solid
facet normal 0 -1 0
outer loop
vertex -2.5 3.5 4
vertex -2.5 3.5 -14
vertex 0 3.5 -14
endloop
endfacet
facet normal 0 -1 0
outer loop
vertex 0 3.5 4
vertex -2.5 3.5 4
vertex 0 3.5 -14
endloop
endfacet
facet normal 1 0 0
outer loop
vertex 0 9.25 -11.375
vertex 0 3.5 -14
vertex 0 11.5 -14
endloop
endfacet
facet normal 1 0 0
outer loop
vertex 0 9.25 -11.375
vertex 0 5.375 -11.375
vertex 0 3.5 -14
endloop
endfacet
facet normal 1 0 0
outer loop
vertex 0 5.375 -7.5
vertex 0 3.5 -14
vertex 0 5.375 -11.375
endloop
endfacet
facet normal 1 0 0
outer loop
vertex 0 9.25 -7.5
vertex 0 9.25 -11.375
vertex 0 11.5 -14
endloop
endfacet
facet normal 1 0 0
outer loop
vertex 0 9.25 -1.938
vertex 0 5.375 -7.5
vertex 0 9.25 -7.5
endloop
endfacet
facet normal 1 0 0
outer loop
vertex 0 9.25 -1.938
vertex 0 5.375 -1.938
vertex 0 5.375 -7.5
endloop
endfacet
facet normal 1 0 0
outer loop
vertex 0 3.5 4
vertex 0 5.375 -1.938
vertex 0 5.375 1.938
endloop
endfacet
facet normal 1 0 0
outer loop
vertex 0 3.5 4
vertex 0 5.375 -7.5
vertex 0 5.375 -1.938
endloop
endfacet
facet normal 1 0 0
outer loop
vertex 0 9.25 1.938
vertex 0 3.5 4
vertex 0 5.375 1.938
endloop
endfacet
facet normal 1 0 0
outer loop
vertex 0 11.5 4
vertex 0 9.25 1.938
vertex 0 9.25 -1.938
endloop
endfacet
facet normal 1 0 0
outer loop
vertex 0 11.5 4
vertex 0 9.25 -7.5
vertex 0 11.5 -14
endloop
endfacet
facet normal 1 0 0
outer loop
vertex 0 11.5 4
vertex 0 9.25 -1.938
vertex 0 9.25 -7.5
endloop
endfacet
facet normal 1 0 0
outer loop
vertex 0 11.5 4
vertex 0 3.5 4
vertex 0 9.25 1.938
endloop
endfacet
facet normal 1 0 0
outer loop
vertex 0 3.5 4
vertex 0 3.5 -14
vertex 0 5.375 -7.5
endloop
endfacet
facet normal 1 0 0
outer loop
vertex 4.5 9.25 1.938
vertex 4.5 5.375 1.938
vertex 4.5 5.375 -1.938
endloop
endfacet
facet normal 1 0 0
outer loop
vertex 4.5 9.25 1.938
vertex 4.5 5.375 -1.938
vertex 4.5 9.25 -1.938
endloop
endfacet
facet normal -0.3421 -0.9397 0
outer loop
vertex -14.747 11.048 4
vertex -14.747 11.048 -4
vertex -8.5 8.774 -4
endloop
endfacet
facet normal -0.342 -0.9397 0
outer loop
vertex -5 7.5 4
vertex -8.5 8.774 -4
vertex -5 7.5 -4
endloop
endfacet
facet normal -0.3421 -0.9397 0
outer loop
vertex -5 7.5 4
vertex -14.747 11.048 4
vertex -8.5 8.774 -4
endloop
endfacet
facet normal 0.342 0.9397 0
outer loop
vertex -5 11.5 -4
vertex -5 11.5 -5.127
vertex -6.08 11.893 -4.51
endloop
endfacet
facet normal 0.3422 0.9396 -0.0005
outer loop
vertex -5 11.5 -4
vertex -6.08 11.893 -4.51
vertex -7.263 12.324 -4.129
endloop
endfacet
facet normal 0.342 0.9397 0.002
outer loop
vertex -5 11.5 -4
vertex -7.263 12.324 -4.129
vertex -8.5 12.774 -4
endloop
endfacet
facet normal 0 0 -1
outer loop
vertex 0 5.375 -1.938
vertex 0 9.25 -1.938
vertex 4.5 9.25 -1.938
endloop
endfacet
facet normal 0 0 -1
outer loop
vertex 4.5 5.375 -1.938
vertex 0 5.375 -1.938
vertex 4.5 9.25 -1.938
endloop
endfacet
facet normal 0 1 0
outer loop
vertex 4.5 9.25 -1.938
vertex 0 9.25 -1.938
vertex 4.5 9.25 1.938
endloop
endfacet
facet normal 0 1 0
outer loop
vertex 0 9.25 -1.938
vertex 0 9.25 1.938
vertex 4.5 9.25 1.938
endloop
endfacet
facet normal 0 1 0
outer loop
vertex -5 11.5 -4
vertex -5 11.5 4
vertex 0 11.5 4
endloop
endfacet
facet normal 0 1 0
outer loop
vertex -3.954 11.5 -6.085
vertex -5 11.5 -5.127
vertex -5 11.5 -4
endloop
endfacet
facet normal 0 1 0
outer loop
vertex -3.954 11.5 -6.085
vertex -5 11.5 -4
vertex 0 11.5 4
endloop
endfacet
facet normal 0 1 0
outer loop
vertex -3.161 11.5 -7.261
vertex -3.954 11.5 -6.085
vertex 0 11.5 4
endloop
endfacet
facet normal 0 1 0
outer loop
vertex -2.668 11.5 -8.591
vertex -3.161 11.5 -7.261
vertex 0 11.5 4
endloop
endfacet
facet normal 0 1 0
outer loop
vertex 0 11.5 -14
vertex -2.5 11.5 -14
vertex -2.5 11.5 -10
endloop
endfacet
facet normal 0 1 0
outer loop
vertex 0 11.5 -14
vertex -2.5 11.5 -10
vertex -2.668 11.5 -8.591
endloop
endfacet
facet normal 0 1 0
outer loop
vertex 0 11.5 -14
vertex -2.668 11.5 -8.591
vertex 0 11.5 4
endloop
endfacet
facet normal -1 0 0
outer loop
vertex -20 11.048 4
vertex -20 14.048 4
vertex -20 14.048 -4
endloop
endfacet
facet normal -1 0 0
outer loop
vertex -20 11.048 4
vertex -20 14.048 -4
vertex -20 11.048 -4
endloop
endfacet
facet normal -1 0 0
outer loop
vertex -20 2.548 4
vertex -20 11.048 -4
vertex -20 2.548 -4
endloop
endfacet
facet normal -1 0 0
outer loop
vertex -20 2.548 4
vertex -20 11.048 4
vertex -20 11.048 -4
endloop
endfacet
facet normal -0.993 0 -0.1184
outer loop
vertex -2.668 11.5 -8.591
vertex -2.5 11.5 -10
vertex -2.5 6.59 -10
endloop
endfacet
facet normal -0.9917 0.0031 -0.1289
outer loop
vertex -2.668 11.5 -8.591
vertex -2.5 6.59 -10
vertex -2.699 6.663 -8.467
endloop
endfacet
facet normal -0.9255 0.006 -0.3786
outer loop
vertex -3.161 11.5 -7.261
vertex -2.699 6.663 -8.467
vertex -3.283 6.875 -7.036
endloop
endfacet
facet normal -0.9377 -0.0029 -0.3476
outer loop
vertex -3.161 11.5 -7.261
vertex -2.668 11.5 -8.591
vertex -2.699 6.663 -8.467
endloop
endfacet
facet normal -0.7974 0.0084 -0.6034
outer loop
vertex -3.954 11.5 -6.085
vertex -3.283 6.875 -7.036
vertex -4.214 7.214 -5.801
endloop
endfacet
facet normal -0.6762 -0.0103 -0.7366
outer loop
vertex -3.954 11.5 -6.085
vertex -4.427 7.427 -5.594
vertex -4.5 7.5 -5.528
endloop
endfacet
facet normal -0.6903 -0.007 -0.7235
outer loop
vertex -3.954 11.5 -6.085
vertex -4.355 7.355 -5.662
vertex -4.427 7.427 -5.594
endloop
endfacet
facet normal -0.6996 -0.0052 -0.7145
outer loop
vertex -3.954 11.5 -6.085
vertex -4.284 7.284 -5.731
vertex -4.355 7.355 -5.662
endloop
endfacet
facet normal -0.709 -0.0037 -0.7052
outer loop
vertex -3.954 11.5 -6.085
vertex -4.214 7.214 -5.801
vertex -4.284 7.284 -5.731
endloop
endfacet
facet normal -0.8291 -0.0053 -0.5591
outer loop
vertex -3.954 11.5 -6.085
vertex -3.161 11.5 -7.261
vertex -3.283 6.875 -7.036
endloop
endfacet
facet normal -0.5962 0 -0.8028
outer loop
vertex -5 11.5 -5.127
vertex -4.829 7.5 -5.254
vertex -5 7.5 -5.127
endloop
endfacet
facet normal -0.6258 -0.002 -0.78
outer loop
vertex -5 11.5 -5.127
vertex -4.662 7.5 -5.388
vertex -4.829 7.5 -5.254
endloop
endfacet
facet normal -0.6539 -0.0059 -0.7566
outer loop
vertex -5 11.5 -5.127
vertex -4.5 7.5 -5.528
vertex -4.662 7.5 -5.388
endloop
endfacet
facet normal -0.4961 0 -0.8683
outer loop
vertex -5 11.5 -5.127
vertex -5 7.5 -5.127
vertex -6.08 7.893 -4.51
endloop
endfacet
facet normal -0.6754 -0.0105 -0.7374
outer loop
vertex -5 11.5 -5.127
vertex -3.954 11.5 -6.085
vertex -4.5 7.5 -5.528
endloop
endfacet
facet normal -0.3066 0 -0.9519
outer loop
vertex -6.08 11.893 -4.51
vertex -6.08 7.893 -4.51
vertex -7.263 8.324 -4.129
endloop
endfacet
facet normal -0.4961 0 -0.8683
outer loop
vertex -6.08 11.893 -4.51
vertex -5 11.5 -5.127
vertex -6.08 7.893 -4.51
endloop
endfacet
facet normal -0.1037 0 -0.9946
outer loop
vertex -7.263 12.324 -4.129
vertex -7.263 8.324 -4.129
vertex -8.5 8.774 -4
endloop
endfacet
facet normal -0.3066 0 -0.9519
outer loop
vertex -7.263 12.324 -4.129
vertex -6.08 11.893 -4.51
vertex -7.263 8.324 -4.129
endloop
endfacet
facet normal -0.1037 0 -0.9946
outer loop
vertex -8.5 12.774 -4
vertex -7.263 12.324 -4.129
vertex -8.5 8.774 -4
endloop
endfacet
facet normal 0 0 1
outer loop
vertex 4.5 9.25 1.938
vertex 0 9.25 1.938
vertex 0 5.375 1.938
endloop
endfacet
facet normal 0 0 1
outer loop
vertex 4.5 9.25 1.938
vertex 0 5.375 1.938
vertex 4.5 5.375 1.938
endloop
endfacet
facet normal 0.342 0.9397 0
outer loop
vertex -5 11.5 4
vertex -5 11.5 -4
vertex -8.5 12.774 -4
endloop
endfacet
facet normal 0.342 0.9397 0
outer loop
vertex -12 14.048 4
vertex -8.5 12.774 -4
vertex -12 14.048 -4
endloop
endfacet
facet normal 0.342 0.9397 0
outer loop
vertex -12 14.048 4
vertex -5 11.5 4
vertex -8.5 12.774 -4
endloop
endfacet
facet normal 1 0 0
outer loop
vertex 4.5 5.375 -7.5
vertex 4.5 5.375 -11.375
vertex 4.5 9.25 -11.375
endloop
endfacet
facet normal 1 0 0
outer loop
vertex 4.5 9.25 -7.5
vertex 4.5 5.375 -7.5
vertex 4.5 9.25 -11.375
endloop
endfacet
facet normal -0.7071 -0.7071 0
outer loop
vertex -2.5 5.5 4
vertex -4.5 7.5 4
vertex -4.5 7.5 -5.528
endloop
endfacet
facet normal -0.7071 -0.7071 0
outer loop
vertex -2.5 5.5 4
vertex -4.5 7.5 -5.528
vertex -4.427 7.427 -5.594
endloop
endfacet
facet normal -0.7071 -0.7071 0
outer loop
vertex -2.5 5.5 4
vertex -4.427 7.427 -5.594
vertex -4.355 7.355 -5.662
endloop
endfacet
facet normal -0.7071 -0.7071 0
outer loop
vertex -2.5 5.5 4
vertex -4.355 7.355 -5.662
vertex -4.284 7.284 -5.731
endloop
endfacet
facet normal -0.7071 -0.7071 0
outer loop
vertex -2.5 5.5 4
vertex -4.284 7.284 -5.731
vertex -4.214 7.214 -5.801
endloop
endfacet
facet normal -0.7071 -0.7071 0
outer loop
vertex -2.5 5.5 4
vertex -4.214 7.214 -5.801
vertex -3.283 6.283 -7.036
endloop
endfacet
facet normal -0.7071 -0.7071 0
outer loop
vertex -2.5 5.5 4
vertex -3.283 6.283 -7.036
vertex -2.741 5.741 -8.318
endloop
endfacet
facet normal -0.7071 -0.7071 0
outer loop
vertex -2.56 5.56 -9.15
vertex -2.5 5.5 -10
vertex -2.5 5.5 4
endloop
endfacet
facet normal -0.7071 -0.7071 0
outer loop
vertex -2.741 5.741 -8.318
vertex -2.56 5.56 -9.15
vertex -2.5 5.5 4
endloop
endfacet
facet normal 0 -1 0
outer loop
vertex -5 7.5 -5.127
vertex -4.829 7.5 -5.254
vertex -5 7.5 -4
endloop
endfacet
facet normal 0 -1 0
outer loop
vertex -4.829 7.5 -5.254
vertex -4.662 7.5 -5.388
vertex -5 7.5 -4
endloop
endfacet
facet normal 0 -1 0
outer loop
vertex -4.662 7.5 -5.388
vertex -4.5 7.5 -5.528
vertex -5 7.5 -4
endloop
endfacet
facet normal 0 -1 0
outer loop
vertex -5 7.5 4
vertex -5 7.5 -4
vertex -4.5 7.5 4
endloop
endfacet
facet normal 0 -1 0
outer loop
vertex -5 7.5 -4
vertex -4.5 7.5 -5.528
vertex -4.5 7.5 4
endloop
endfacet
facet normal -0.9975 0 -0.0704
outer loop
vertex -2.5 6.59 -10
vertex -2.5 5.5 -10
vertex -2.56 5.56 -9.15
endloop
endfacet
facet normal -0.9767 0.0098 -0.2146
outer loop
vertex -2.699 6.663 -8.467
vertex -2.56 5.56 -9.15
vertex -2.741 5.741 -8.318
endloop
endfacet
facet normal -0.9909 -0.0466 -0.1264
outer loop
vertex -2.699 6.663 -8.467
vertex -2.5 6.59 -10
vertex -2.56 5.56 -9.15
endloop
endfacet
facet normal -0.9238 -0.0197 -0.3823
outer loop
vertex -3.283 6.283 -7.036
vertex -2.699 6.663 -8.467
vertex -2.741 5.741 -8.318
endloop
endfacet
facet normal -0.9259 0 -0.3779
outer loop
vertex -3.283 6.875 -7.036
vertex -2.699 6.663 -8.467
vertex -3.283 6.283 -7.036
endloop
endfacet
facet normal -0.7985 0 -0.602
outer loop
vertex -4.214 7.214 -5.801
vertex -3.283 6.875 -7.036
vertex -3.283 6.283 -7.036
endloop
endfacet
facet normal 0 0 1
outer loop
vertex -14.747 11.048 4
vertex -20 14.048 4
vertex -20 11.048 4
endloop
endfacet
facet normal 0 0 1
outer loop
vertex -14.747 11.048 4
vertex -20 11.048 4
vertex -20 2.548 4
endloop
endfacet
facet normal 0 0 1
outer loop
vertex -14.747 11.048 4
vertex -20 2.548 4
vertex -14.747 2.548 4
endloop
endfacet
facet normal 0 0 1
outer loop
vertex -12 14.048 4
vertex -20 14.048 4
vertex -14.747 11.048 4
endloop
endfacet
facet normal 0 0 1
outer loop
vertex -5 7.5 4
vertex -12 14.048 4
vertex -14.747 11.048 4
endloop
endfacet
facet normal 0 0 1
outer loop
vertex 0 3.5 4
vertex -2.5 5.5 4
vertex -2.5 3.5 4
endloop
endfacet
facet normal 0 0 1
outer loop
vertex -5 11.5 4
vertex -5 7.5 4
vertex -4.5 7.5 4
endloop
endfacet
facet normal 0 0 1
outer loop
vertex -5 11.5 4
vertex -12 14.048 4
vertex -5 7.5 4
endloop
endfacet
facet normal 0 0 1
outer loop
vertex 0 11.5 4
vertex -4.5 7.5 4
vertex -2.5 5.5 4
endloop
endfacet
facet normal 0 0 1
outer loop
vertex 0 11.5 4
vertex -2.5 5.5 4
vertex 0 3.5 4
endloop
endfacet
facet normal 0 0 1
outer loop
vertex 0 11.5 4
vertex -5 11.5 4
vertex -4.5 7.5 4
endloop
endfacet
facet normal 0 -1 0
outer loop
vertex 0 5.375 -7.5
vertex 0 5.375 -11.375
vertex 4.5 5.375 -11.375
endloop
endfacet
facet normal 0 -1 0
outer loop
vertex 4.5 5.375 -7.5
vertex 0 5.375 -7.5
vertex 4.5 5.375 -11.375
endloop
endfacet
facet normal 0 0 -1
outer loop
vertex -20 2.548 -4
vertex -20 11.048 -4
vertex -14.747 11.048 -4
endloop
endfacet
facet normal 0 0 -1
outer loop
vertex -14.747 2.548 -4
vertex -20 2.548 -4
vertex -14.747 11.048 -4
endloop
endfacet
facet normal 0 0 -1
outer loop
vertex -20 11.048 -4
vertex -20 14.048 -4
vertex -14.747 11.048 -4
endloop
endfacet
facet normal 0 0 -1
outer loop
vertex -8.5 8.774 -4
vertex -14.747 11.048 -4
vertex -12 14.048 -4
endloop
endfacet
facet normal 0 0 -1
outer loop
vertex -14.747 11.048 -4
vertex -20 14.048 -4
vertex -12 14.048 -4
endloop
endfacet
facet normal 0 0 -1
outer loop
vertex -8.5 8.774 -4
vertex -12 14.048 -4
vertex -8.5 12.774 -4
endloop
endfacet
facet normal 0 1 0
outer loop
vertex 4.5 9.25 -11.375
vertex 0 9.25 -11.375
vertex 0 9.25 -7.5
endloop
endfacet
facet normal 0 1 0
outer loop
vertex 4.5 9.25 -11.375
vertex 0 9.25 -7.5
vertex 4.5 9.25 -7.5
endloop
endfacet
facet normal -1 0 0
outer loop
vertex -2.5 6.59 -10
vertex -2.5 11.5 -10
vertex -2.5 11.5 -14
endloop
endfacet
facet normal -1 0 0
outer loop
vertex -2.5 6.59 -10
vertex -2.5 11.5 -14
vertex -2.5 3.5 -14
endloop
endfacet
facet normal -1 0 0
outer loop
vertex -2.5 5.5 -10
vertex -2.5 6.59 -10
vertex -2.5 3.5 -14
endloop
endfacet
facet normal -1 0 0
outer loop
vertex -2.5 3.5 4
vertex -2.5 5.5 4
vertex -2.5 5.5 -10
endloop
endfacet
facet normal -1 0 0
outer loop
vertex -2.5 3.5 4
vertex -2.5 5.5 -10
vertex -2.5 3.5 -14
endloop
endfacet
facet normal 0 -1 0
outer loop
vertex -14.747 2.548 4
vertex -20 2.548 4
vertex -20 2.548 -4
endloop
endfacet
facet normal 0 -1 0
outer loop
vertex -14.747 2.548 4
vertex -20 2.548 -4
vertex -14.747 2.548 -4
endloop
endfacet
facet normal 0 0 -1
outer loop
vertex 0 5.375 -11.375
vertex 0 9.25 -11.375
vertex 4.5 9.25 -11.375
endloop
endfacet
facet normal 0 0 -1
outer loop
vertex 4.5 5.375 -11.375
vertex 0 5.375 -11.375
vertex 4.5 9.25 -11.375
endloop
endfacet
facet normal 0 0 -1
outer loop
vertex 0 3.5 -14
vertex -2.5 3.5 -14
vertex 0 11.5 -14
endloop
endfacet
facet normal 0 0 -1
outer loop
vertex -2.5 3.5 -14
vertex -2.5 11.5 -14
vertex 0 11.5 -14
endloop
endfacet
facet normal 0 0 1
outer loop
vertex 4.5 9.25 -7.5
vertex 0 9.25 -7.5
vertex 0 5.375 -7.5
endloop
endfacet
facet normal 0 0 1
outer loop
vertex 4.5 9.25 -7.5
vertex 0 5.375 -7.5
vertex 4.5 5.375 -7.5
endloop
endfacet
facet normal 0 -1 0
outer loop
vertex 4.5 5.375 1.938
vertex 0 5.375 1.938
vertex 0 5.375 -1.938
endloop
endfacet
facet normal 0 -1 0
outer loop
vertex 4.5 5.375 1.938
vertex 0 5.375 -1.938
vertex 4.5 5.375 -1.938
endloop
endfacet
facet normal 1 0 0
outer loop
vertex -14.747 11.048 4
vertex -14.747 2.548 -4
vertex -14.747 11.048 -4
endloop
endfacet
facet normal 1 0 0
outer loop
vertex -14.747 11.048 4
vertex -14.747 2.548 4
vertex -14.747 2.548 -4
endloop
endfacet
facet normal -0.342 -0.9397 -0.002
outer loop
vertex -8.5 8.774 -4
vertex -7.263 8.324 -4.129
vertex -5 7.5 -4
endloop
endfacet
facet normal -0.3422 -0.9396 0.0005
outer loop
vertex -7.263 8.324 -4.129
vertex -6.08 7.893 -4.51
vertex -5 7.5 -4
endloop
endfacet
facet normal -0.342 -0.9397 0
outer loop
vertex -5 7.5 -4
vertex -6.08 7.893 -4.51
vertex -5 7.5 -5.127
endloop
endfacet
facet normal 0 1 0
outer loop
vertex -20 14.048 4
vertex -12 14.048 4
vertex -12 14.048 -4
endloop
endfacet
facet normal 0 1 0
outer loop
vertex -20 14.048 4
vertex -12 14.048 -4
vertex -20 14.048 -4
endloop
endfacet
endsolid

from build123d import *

# Parameters (mm, degrees)
SKETCH1_W           = 5.252522581
SKETCH1_H           = 8.5
BOSS_EXTRUDE1_DEPTH = 4
BOSS_EXTRUDE4_DEPTH = 14
SKETCH1_3_W         = 4.5
SKETCH1_3_H         = 3.875
BOSS_EXTRUDE2_DEPTH = 1.9375
BOSS_EXTRUDE5_START = -11.375
SKETCH1_8_W         = 4.5
SKETCH1_8_H         = 3.875
BOSS_EXTRUDE5_DEPTH = 3.875
FILLET1_R           = 6


with BuildPart() as part:
    # Sketch1 → Boss-Extrude1 (new, symmetric)
    with BuildSketch(Plane.XY):
        Polygon((-5, 7.5), (-4.5, 7.5), (-2.5, 5.5), (-2.5, 3.5), (0, 3.5), (0, 11.5), (-5, 11.5), align=None)
        Polygon((-20, 11.04779164), (-14.747477419, 11.04779164), (-5, 7.5), (-5, 11.5), (-12, 14.04779164), (-20, 14.04779164), align=None)
        with Locations((-17.373738709, 6.79779164)):
            Rectangle(SKETCH1_W, SKETCH1_H)
    extrude(amount=BOSS_EXTRUDE1_DEPTH, both=True)

    # Sketch1<7> → Boss-Extrude4 (add)
    with BuildSketch(Plane.XY):
        Polygon((-2.5, 3.5), (0, 3.5), (0, 5.375), (0, 9.25), (0, 11.5), (-2.5, 11.5), (-2.5, 5.5), align=None)
    extrude(amount=-BOSS_EXTRUDE4_DEPTH)

    # Sketch1<3> → Boss-Extrude2 (add, symmetric)
    with BuildSketch(Plane.XY):
        with Locations((2.25, 7.3125)):
            Rectangle(SKETCH1_3_W, SKETCH1_3_H)
    extrude(amount=BOSS_EXTRUDE2_DEPTH, both=True)

    # Sketch1<8> → Boss-Extrude5 (add)
    with BuildSketch(Plane.XY.offset(BOSS_EXTRUDE5_START)):
        with Locations((2.25, 7.3125)):
            Rectangle(SKETCH1_8_W, SKETCH1_8_H)
    extrude(amount=BOSS_EXTRUDE5_DEPTH)

    # Fillet1
    # the kernel refuses this fillet: 6 mm, written as the material it adds along each edge
    with BuildSketch(Plane(origin=(-2.5, 11.5, -4), x_dir=(-1, 0, 0), z_dir=(0, -1, 0))) as fillet1_piece_1_section:
        with BuildLine():
            CenterArc((FILLET1_R, FILLET1_R), FILLET1_R, 180, 90)
            Line((0, FILLET1_R), (0, 0))
            Line((0, 0), (FILLET1_R, 0))
        make_face()
    fillet1_piece_1 = extrude(amount=21, mode=Mode.PRIVATE)
    fillet1_piece_1 = split(fillet1_piece_1, bisect_by=Plane(origin=(-3.153811187, 10.828042225, -5.911199104), z_dir=(0.3420201433256695, 0.9396926207859081, 0)), keep=Keep.TOP, mode=Mode.PRIVATE)
    add(fillet1_piece_1)
    with BuildSketch(Plane(origin=(-2.5, 26.5, -4), x_dir=(-1, 0, 0), z_dir=(0, -1, 0))) as fillet1_piece_2_section:
        with BuildLine():
            CenterArc((FILLET1_R, FILLET1_R), FILLET1_R, 180, 90)
            Line((0, FILLET1_R), (0, 0))
            Line((0, 0), (FILLET1_R, 0))
        make_face()
    fillet1_piece_2 = extrude(amount=36, mode=Mode.PRIVATE)
    fillet1_piece_2 = split(fillet1_piece_2, bisect_by=Plane(origin=(-6.665111155, 12.106050897, -4.105232665), z_dir=(-0.3420201433256695, -0.9396926207859081, 0)), keep=Keep.TOP, mode=Mode.PRIVATE)
    fillet1_piece_2 = split(fillet1_piece_2, bisect_by=Plane(origin=(-6.768551784, 11.5, -4.105232665), z_dir=(0, 1, 0)), keep=Keep.TOP, mode=Mode.PRIVATE)
    add(fillet1_piece_2)
    with BuildSketch(Plane(origin=(-2.5, 11.5, -4), x_dir=(-1, 0, 0), z_dir=(0, -1, 0))) as fillet1_piece_3_section:
        with BuildLine():
            CenterArc((FILLET1_R, FILLET1_R), FILLET1_R, 180, 90)
            Line((0, FILLET1_R), (0, 0))
            Line((0, 0), (FILLET1_R, 0))
        make_face()
    fillet1_piece_3 = extrude(amount=21, mode=Mode.PRIVATE)
    fillet1_piece_3 = split(fillet1_piece_3, bisect_by=Plane(origin=(-3.734199971, 7.5, -5.388361027), z_dir=(0, 1, 0)), keep=Keep.TOP, mode=Mode.PRIVATE)
    fillet1_piece_3 = split(fillet1_piece_3, bisect_by=Plane(origin=(-3.190866328, 10.841529194, -5.388361027), z_dir=(-0.3420201433256695, -0.9396926207859081, 0)), keep=Keep.TOP, mode=Mode.PRIVATE)
    fillet1_piece_3 = split(fillet1_piece_3, bisect_by=Plane(origin=(-5.041466125, 8.041466125, -5.388361027), z_dir=(0.7071067811865476, 0.7071067811865476, 0)), keep=Keep.TOP, mode=Mode.PRIVATE)
    add(fillet1_piece_3)
    with BuildSketch(Plane(origin=(-2.5, 11.5, -4), x_dir=(-1, 0, 0), z_dir=(0, -1, 0))) as fillet1_piece_4_section:
        with BuildLine():
            CenterArc((FILLET1_R, FILLET1_R), FILLET1_R, 180, 90)
            Line((0, FILLET1_R), (0, 0))
            Line((0, 0), (FILLET1_R, 0))
        make_face()
    fillet1_piece_4 = extrude(amount=21, mode=Mode.PRIVATE)
    fillet1_piece_4 = split(fillet1_piece_4, bisect_by=Plane(origin=(-2.999537912, 7.5, -5.943273976), z_dir=(0, -1, 0)), keep=Keep.TOP, mode=Mode.PRIVATE)
    fillet1_piece_4 = split(fillet1_piece_4, bisect_by=Plane(origin=(-3.116705646, 6.814536913, -5.943273976), z_dir=(0.3420201433256692, 0.9396926207859082, 0)), keep=Keep.TOP, mode=Mode.PRIVATE)
    fillet1_piece_4 = split(fillet1_piece_4, bisect_by=Plane(origin=(-3.567995264, 6.567995264, -5.943273976), z_dir=(0.7071067811865476, 0.7071067811865476, 0)), keep=Keep.TOP, mode=Mode.PRIVATE)
    add(fillet1_piece_4)
    with BuildSketch(Plane(origin=(-2.5, 11.5, -4), x_dir=(-1, 0, 0), z_dir=(0, -1, 0))) as fillet1_piece_5_section:
        with BuildLine():
            CenterArc((FILLET1_R, FILLET1_R), FILLET1_R, 180, 90)
            Line((0, FILLET1_R), (0, 0))
            Line((0, 0), (FILLET1_R, 0))
        make_face()
    fillet1_piece_5 = extrude(amount=21, mode=Mode.PRIVATE)
    fillet1_piece_5 = split(fillet1_piece_5, bisect_by=Plane(origin=(-6.347942504, 7.5, -4.191885591), z_dir=(0, 1, 0)), keep=Keep.TOP, mode=Mode.PRIVATE)
    fillet1_piece_5 = split(fillet1_piece_5, bisect_by=Plane(origin=(-6.566870253, 8.070294133, -4.191885591), z_dir=(0.3420201433256692, 0.9396926207859082, 0)), keep=Keep.TOP, mode=Mode.PRIVATE)
    fillet1_piece_5 = split(fillet1_piece_5, bisect_by=Plane(origin=(-6.009867842, 9.009867842, -4.191885591), z_dir=(-0.7071067811865476, -0.7071067811865476, 0)), keep=Keep.TOP, mode=Mode.PRIVATE)
    add(fillet1_piece_5)
    with BuildSketch(Plane(origin=(-2.5, 11.5, -4), x_dir=(-1, 0, 0), z_dir=(0, -1, 0))) as fillet1_piece_6_section:
        with BuildLine():
            CenterArc((FILLET1_R, FILLET1_R), FILLET1_R, 180, 90)
            Line((0, FILLET1_R), (0, 0))
            Line((0, 0), (FILLET1_R, 0))
        make_face()
    fillet1_piece_6 = extrude(amount=21, mode=Mode.PRIVATE)
    fillet1_piece_6 = split(fillet1_piece_6, bisect_by=Plane(origin=(-2.735586813, 6.675821002, -6.085139246), z_dir=(-0.3420201433256692, -0.9396926207859082, 0)), keep=Keep.TOP, mode=Mode.PRIVATE)
    fillet1_piece_6 = split(fillet1_piece_6, bisect_by=Plane(origin=(-3.085930182, 6.085930182, -6.085139246), z_dir=(0.7071067811865476, 0.7071067811865476, 0)), keep=Keep.TOP, mode=Mode.PRIVATE)
    add(fillet1_piece_6)


solid = part.part
